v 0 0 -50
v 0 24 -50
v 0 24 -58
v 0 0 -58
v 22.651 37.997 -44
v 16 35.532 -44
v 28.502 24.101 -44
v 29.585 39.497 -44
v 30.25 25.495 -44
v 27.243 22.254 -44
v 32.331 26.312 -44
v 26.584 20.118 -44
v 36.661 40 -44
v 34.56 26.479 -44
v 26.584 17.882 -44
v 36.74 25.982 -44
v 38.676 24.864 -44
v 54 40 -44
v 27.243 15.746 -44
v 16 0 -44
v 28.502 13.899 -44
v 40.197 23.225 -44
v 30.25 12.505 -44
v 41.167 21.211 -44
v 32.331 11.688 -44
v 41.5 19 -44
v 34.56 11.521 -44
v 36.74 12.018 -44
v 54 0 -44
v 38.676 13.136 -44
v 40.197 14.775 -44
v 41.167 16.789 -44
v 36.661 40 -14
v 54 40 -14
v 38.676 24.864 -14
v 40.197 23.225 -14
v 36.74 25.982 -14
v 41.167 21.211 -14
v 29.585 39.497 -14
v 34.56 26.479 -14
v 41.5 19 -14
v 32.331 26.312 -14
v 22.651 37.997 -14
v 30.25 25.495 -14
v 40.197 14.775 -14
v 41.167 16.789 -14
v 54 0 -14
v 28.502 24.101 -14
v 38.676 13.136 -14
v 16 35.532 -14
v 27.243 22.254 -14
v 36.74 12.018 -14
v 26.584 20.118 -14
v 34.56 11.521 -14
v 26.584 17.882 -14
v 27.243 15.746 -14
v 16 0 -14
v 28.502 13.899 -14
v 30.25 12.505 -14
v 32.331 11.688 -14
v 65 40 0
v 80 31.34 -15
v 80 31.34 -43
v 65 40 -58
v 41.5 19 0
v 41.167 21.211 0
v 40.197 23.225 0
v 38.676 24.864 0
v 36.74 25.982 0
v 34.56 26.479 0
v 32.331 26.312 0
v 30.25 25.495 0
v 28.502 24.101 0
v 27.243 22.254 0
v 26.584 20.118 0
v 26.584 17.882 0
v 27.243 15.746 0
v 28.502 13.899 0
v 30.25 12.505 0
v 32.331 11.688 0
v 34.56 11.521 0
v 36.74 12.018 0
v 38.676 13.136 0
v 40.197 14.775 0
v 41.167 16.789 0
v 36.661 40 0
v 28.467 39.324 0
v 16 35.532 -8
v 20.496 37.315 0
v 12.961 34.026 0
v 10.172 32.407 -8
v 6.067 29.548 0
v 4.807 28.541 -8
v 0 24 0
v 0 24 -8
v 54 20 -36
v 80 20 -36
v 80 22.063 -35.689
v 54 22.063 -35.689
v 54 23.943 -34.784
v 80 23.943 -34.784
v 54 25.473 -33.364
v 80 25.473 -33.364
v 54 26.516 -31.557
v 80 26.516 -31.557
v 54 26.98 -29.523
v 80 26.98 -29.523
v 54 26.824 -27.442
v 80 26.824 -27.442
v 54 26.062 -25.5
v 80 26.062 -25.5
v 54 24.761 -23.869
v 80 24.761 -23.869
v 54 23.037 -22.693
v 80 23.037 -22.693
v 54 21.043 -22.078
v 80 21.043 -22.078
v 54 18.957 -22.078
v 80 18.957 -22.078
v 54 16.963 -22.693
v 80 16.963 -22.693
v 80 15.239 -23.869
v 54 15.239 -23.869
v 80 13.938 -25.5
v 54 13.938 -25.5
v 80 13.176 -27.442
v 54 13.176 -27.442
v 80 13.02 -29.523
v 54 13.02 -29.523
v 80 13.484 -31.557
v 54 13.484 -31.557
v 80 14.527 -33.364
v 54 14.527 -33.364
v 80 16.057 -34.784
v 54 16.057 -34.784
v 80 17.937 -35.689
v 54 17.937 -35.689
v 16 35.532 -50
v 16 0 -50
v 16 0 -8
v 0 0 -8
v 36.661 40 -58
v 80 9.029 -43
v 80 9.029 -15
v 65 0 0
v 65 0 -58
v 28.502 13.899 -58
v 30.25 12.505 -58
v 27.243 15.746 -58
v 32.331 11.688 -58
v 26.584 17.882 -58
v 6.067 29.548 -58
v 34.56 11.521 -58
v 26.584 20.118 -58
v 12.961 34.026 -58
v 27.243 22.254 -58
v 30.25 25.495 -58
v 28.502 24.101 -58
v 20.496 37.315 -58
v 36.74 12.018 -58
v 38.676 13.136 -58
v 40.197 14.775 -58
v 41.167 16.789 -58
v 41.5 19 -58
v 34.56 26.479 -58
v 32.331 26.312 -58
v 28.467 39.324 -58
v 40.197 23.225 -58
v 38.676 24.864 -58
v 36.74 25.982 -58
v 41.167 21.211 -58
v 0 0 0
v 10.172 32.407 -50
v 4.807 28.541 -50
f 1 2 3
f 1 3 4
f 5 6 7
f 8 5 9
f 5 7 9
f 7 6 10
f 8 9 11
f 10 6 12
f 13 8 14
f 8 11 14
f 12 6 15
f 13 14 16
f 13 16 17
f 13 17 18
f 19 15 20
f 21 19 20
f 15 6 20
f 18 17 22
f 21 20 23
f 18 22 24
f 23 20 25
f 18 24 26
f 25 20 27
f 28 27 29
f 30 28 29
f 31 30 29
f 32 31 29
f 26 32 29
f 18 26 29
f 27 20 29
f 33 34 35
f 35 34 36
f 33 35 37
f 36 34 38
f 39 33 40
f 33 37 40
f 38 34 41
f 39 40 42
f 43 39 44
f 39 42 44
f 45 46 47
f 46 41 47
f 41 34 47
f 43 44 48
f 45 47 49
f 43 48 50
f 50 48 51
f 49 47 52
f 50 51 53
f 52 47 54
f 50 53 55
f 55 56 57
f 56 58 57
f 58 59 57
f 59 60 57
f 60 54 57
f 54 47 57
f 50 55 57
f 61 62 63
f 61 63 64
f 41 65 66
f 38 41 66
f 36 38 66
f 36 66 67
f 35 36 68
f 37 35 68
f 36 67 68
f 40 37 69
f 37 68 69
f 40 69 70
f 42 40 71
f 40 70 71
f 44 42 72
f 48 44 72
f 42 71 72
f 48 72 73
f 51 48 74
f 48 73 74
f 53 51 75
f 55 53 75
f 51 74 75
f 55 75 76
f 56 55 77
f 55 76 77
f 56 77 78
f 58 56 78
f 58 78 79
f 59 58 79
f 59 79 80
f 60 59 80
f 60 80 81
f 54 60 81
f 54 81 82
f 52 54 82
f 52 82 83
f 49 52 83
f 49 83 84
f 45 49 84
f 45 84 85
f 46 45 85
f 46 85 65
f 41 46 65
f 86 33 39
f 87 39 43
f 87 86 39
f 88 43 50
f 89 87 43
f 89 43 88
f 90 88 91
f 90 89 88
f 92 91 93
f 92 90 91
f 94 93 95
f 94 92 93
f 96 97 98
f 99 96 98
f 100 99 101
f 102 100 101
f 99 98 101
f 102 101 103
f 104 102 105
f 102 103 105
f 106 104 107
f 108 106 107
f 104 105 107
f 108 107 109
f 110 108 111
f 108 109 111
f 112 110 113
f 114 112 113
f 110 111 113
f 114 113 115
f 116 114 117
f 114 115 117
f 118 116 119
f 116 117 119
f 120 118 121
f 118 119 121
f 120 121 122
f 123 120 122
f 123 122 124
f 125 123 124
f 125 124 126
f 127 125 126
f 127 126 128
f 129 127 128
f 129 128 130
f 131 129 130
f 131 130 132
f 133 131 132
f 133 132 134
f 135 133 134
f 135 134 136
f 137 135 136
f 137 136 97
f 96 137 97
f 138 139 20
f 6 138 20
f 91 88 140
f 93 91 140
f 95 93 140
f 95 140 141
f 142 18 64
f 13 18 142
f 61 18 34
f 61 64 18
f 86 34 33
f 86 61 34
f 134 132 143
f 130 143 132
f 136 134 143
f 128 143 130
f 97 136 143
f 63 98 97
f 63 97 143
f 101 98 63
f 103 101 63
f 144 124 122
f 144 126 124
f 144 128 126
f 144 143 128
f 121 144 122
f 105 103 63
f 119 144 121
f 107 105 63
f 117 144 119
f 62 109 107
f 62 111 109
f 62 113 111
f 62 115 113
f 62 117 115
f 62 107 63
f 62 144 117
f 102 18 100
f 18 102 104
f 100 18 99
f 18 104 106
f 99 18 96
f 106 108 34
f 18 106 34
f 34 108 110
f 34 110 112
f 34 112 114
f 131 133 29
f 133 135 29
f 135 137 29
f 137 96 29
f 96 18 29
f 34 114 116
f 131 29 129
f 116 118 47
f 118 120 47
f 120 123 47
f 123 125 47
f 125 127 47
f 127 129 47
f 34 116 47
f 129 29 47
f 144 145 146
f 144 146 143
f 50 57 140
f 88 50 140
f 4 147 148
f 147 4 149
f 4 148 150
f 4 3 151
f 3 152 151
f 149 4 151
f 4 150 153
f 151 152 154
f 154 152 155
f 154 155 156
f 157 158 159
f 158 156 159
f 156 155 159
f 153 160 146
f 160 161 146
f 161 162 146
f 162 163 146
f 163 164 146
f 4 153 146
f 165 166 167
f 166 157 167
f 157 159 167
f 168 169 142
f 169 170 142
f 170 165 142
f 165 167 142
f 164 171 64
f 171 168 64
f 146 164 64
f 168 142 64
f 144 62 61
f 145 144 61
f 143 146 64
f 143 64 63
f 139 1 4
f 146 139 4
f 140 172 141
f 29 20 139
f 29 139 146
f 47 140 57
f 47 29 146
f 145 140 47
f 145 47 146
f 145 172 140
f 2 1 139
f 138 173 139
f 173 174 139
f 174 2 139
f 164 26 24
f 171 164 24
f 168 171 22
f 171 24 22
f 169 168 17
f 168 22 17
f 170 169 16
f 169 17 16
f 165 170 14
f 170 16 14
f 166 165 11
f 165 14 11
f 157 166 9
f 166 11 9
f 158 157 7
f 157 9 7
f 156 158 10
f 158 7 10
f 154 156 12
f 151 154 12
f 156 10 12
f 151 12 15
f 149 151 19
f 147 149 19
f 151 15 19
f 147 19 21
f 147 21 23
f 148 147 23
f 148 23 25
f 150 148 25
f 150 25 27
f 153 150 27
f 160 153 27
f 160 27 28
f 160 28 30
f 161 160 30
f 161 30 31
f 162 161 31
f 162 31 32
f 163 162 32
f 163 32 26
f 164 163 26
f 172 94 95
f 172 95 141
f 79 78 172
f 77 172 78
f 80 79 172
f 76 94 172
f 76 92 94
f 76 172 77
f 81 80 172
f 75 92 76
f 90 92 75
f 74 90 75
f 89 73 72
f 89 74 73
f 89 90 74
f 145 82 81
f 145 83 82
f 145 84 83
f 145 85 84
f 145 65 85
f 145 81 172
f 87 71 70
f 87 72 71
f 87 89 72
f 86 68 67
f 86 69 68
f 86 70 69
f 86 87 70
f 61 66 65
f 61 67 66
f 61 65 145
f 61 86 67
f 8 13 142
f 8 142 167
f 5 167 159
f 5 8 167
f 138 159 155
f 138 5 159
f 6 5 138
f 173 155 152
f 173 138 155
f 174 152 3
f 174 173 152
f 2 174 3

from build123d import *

# Parameters (mm, degrees)
BOSS_EXTRUDE1_DEPTH = 58
SKETCH3_R           = 7.5
CUT_EXTRUDE1_DEPTH  = 107.60206377
CUT_EXTRUDE2_DEPTH  = 107.60206377
CUT_EXTRUDE3_DEPTH  = 107.60206377
SKETCH6_R           = 7
CUT_EXTRUDE4_DEPTH  = 107.60206377


with BuildPart() as part:
    # Sketch2 → Boss-Extrude1 (new body)
    with BuildSketch(Plane.XY):
        with BuildLine():
            Line((0, 0), (65, 0))
            Line((65, 0), (80, 9.029262631))
            Line((80, 9.029262631), (80, 31.339745962))
            Line((80, 31.339745962), (65, 40))
            Line((65, 40), (36.66060556, 40))
            ThreePointArc((36.66060556, 40), (16.66060556, 35.82575695), (0, 24))
            Line((0, 24), (0, 0))
        make_face()
    extrude(amount=-BOSS_EXTRUDE1_DEPTH)

    # Sketch3 → Cut-Extrude1 (cut, through all)
    with BuildSketch(Plane.XY):
        with Locations((34, 19)):
            Circle(SKETCH3_R)
    extrude(amount=-CUT_EXTRUDE1_DEPTH, mode=Mode.SUBTRACT)

    # Sketch4 → Cut-Extrude2 (cut, through all)
    with BuildSketch(Plane(origin=(0, 0, 0), x_dir=(1, 0, 0), z_dir=(0, 1, 0))):
        Polygon((65, 58), (80, 43), (80, 58), align=None)
        Polygon((80, 0), (80, 15), (65, 0), align=None)
    extrude(amount=CUT_EXTRUDE2_DEPTH, mode=Mode.SUBTRACT)

    # Sketch5 → Cut-Extrude3 (cut, through all)
    with BuildSketch(Plane.XZ):
        Polygon((0, -8), (0, -50), (16, -50), (16, -44), (54, -44), (54, -14), (16, -14), (16, -8), align=None)
    extrude(amount=-CUT_EXTRUDE3_DEPTH, mode=Mode.SUBTRACT)

    # Sketch6 → Cut-Extrude4 (cut, through all)
    with BuildSketch(Plane(origin=(80, 0, 0), x_dir=(0, 0, -1), z_dir=(1, 0, 0))):
        with Locations((29, 20)):
            Circle(SKETCH6_R)
    extrude(amount=-CUT_EXTRUDE4_DEPTH, mode=Mode.SUBTRACT)


solid = part.part
